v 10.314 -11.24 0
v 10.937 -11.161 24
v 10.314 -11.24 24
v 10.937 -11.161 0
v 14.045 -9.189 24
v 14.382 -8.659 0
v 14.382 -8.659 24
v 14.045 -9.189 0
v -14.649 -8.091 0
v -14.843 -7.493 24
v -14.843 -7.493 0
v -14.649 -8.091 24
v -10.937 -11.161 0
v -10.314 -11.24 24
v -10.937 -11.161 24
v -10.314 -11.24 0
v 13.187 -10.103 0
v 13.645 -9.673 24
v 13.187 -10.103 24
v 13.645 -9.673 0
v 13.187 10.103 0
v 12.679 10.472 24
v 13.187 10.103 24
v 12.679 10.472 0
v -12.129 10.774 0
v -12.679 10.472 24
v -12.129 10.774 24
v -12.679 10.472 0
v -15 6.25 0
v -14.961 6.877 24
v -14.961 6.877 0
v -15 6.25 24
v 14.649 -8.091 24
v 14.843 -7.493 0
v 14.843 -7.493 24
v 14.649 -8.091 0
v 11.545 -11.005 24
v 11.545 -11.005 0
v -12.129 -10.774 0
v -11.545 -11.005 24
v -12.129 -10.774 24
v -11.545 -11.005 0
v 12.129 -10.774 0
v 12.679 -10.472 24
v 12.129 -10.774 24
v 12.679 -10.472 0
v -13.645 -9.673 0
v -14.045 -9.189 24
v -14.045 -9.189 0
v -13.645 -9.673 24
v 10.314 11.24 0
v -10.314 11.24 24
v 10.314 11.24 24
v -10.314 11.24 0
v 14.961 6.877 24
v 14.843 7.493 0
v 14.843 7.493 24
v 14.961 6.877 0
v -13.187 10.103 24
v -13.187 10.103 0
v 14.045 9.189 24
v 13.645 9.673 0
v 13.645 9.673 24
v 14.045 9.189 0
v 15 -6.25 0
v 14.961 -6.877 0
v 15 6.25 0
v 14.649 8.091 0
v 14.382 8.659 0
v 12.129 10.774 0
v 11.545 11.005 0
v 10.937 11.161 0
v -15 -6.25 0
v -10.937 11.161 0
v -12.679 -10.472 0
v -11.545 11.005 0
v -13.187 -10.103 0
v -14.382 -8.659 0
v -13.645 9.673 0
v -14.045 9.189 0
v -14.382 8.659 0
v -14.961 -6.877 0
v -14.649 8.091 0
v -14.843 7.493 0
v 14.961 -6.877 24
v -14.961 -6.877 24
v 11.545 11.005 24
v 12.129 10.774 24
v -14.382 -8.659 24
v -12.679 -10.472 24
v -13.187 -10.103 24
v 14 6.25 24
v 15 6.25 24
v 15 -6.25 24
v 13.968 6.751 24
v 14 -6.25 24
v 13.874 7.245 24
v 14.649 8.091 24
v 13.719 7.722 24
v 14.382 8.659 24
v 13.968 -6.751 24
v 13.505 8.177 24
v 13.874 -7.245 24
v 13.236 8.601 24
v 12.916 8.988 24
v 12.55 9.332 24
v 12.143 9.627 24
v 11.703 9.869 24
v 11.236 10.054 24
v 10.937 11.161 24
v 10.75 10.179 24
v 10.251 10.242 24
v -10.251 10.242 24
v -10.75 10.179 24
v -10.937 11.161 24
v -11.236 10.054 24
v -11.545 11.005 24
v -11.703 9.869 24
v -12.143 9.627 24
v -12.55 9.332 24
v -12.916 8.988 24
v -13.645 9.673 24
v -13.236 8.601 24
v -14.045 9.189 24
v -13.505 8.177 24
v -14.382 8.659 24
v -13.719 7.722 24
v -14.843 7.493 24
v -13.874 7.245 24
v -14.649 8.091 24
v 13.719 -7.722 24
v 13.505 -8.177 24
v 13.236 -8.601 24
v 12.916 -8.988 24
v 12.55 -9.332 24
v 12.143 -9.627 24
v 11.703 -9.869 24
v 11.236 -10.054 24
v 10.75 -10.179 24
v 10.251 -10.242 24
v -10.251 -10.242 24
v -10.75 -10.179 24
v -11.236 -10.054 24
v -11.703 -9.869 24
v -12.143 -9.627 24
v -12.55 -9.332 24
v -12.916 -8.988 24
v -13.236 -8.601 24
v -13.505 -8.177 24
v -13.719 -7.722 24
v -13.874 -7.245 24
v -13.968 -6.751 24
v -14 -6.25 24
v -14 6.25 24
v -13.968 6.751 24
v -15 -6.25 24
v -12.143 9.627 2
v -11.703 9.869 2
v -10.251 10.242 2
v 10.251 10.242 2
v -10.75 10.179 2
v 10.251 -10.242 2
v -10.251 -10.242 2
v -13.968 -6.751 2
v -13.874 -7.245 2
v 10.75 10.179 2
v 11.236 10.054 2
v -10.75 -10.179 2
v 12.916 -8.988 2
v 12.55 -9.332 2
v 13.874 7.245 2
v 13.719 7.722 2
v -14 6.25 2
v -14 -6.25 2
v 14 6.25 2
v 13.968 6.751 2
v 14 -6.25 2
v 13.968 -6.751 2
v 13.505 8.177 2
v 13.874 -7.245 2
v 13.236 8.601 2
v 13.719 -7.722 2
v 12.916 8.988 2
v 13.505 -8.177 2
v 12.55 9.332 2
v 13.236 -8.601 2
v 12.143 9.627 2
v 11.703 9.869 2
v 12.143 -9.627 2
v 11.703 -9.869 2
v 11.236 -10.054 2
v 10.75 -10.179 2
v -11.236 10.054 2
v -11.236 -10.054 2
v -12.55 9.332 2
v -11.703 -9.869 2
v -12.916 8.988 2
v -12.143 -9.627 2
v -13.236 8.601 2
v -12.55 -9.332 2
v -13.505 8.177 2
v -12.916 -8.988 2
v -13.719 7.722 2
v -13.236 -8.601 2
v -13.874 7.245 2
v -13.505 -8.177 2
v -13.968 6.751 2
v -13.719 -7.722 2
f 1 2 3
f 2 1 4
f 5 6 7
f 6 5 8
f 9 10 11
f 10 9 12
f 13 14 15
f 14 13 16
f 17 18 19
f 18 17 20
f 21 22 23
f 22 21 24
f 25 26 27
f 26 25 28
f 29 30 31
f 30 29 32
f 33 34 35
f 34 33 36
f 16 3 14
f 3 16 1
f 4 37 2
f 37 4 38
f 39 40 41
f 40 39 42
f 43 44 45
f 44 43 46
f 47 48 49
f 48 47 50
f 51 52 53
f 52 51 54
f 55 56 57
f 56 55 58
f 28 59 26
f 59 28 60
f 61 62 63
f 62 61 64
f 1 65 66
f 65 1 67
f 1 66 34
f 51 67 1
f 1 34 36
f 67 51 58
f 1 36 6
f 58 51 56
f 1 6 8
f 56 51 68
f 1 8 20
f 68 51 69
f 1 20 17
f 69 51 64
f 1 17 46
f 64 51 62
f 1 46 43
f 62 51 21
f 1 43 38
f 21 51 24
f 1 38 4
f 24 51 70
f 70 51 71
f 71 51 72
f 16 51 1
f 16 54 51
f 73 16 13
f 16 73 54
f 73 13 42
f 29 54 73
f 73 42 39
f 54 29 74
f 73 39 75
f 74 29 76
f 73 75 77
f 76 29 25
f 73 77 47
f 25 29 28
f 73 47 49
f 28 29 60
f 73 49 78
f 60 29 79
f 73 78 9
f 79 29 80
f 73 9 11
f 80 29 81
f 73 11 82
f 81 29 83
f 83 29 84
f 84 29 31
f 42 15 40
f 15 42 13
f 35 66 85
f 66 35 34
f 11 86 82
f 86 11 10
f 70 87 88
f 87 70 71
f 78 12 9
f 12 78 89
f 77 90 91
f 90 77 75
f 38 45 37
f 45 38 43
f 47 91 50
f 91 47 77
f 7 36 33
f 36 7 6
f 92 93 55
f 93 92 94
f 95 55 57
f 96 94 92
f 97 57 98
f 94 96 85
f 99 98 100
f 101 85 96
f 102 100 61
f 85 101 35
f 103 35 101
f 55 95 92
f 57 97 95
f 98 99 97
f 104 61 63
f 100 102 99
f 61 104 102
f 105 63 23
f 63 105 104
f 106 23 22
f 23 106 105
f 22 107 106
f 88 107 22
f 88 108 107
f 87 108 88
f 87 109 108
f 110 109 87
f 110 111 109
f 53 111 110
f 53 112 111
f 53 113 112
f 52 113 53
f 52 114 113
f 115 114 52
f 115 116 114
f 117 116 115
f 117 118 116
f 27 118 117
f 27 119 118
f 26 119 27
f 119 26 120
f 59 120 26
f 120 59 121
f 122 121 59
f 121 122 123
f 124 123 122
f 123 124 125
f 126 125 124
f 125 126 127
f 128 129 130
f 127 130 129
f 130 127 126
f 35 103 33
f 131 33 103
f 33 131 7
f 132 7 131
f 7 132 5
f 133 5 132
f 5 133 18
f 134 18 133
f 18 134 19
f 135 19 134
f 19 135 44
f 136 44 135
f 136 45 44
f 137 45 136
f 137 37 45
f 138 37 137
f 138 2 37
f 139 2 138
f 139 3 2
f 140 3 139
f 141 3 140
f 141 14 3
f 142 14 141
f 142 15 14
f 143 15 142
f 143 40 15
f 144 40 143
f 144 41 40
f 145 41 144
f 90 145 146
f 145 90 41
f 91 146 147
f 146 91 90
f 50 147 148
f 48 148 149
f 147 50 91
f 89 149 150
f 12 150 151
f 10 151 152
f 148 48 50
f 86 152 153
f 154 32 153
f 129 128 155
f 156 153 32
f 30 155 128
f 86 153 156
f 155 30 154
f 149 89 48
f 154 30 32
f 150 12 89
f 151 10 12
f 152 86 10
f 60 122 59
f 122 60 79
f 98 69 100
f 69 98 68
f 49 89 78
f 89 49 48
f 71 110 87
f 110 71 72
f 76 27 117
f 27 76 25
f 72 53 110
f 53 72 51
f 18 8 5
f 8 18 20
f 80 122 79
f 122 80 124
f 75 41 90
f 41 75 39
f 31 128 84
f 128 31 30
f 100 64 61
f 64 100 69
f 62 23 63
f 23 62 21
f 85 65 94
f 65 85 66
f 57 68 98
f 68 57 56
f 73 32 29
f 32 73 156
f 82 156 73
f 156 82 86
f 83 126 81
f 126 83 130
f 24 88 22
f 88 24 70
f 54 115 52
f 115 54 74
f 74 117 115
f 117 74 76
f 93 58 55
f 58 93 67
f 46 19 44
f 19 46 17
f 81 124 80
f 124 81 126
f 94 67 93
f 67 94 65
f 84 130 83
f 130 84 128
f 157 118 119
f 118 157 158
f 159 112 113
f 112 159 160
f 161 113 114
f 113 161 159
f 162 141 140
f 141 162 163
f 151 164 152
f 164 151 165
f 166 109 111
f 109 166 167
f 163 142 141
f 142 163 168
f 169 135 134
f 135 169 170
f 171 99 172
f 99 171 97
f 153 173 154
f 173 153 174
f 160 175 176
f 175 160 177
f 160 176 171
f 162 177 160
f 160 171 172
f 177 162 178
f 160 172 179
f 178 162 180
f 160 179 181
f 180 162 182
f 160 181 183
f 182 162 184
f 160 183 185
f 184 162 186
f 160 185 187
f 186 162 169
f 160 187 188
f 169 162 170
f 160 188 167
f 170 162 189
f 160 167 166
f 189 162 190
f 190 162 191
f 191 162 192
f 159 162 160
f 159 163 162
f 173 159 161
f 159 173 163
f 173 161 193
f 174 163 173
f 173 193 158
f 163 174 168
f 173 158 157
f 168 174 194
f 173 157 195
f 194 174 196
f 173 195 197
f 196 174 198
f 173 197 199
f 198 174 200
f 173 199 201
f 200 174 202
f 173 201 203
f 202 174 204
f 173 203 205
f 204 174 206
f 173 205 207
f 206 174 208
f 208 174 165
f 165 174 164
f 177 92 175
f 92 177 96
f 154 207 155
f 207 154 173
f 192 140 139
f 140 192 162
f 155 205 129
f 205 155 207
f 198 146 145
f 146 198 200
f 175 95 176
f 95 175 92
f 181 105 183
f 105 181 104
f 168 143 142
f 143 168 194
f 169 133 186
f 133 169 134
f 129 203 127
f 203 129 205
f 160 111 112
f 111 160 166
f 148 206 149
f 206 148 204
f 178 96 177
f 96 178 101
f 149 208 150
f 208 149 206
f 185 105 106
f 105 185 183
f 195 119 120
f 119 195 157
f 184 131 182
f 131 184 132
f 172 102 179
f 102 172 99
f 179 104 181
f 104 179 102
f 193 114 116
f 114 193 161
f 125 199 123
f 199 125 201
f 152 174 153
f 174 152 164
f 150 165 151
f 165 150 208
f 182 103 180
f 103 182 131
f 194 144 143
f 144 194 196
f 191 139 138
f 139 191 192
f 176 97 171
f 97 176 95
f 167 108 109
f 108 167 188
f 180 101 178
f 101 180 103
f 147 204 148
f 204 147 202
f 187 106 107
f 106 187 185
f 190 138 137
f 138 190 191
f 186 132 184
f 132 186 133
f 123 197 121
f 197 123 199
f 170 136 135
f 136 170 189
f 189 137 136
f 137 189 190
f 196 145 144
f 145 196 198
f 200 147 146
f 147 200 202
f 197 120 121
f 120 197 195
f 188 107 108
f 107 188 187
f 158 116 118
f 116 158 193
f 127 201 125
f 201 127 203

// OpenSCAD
$fn = 50;


difference() {
	union() {
		hull() {
			translate(v = [-10.0000000000, 6.2500000000, 0]) {
				cylinder(h = 24, r = 5);
			}
			translate(v = [10.0000000000, 6.2500000000, 0]) {
				cylinder(h = 24, r = 5);
			}
			translate(v = [-10.0000000000, -6.2500000000, 0]) {
				cylinder(h = 24, r = 5);
			}
			translate(v = [10.0000000000, -6.2500000000, 0]) {
				cylinder(h = 24, r = 5);
			}
		}
	}
	union() {
		translate(v = [0, 0, 2]) {
			hull() {
				translate(v = [-10.0000000000, 6.2500000000, 0]) {
					cylinder(h = 22, r = 4);
				}
				translate(v = [10.0000000000, 6.2500000000, 0]) {
					cylinder(h = 22, r = 4);
				}
				translate(v = [-10.0000000000, -6.2500000000, 0]) {
					cylinder(h = 22, r = 4);
				}
				translate(v = [10.0000000000, -6.2500000000, 0]) {
					cylinder(h = 22, r = 4);
				}
			}
		}
	}
}
